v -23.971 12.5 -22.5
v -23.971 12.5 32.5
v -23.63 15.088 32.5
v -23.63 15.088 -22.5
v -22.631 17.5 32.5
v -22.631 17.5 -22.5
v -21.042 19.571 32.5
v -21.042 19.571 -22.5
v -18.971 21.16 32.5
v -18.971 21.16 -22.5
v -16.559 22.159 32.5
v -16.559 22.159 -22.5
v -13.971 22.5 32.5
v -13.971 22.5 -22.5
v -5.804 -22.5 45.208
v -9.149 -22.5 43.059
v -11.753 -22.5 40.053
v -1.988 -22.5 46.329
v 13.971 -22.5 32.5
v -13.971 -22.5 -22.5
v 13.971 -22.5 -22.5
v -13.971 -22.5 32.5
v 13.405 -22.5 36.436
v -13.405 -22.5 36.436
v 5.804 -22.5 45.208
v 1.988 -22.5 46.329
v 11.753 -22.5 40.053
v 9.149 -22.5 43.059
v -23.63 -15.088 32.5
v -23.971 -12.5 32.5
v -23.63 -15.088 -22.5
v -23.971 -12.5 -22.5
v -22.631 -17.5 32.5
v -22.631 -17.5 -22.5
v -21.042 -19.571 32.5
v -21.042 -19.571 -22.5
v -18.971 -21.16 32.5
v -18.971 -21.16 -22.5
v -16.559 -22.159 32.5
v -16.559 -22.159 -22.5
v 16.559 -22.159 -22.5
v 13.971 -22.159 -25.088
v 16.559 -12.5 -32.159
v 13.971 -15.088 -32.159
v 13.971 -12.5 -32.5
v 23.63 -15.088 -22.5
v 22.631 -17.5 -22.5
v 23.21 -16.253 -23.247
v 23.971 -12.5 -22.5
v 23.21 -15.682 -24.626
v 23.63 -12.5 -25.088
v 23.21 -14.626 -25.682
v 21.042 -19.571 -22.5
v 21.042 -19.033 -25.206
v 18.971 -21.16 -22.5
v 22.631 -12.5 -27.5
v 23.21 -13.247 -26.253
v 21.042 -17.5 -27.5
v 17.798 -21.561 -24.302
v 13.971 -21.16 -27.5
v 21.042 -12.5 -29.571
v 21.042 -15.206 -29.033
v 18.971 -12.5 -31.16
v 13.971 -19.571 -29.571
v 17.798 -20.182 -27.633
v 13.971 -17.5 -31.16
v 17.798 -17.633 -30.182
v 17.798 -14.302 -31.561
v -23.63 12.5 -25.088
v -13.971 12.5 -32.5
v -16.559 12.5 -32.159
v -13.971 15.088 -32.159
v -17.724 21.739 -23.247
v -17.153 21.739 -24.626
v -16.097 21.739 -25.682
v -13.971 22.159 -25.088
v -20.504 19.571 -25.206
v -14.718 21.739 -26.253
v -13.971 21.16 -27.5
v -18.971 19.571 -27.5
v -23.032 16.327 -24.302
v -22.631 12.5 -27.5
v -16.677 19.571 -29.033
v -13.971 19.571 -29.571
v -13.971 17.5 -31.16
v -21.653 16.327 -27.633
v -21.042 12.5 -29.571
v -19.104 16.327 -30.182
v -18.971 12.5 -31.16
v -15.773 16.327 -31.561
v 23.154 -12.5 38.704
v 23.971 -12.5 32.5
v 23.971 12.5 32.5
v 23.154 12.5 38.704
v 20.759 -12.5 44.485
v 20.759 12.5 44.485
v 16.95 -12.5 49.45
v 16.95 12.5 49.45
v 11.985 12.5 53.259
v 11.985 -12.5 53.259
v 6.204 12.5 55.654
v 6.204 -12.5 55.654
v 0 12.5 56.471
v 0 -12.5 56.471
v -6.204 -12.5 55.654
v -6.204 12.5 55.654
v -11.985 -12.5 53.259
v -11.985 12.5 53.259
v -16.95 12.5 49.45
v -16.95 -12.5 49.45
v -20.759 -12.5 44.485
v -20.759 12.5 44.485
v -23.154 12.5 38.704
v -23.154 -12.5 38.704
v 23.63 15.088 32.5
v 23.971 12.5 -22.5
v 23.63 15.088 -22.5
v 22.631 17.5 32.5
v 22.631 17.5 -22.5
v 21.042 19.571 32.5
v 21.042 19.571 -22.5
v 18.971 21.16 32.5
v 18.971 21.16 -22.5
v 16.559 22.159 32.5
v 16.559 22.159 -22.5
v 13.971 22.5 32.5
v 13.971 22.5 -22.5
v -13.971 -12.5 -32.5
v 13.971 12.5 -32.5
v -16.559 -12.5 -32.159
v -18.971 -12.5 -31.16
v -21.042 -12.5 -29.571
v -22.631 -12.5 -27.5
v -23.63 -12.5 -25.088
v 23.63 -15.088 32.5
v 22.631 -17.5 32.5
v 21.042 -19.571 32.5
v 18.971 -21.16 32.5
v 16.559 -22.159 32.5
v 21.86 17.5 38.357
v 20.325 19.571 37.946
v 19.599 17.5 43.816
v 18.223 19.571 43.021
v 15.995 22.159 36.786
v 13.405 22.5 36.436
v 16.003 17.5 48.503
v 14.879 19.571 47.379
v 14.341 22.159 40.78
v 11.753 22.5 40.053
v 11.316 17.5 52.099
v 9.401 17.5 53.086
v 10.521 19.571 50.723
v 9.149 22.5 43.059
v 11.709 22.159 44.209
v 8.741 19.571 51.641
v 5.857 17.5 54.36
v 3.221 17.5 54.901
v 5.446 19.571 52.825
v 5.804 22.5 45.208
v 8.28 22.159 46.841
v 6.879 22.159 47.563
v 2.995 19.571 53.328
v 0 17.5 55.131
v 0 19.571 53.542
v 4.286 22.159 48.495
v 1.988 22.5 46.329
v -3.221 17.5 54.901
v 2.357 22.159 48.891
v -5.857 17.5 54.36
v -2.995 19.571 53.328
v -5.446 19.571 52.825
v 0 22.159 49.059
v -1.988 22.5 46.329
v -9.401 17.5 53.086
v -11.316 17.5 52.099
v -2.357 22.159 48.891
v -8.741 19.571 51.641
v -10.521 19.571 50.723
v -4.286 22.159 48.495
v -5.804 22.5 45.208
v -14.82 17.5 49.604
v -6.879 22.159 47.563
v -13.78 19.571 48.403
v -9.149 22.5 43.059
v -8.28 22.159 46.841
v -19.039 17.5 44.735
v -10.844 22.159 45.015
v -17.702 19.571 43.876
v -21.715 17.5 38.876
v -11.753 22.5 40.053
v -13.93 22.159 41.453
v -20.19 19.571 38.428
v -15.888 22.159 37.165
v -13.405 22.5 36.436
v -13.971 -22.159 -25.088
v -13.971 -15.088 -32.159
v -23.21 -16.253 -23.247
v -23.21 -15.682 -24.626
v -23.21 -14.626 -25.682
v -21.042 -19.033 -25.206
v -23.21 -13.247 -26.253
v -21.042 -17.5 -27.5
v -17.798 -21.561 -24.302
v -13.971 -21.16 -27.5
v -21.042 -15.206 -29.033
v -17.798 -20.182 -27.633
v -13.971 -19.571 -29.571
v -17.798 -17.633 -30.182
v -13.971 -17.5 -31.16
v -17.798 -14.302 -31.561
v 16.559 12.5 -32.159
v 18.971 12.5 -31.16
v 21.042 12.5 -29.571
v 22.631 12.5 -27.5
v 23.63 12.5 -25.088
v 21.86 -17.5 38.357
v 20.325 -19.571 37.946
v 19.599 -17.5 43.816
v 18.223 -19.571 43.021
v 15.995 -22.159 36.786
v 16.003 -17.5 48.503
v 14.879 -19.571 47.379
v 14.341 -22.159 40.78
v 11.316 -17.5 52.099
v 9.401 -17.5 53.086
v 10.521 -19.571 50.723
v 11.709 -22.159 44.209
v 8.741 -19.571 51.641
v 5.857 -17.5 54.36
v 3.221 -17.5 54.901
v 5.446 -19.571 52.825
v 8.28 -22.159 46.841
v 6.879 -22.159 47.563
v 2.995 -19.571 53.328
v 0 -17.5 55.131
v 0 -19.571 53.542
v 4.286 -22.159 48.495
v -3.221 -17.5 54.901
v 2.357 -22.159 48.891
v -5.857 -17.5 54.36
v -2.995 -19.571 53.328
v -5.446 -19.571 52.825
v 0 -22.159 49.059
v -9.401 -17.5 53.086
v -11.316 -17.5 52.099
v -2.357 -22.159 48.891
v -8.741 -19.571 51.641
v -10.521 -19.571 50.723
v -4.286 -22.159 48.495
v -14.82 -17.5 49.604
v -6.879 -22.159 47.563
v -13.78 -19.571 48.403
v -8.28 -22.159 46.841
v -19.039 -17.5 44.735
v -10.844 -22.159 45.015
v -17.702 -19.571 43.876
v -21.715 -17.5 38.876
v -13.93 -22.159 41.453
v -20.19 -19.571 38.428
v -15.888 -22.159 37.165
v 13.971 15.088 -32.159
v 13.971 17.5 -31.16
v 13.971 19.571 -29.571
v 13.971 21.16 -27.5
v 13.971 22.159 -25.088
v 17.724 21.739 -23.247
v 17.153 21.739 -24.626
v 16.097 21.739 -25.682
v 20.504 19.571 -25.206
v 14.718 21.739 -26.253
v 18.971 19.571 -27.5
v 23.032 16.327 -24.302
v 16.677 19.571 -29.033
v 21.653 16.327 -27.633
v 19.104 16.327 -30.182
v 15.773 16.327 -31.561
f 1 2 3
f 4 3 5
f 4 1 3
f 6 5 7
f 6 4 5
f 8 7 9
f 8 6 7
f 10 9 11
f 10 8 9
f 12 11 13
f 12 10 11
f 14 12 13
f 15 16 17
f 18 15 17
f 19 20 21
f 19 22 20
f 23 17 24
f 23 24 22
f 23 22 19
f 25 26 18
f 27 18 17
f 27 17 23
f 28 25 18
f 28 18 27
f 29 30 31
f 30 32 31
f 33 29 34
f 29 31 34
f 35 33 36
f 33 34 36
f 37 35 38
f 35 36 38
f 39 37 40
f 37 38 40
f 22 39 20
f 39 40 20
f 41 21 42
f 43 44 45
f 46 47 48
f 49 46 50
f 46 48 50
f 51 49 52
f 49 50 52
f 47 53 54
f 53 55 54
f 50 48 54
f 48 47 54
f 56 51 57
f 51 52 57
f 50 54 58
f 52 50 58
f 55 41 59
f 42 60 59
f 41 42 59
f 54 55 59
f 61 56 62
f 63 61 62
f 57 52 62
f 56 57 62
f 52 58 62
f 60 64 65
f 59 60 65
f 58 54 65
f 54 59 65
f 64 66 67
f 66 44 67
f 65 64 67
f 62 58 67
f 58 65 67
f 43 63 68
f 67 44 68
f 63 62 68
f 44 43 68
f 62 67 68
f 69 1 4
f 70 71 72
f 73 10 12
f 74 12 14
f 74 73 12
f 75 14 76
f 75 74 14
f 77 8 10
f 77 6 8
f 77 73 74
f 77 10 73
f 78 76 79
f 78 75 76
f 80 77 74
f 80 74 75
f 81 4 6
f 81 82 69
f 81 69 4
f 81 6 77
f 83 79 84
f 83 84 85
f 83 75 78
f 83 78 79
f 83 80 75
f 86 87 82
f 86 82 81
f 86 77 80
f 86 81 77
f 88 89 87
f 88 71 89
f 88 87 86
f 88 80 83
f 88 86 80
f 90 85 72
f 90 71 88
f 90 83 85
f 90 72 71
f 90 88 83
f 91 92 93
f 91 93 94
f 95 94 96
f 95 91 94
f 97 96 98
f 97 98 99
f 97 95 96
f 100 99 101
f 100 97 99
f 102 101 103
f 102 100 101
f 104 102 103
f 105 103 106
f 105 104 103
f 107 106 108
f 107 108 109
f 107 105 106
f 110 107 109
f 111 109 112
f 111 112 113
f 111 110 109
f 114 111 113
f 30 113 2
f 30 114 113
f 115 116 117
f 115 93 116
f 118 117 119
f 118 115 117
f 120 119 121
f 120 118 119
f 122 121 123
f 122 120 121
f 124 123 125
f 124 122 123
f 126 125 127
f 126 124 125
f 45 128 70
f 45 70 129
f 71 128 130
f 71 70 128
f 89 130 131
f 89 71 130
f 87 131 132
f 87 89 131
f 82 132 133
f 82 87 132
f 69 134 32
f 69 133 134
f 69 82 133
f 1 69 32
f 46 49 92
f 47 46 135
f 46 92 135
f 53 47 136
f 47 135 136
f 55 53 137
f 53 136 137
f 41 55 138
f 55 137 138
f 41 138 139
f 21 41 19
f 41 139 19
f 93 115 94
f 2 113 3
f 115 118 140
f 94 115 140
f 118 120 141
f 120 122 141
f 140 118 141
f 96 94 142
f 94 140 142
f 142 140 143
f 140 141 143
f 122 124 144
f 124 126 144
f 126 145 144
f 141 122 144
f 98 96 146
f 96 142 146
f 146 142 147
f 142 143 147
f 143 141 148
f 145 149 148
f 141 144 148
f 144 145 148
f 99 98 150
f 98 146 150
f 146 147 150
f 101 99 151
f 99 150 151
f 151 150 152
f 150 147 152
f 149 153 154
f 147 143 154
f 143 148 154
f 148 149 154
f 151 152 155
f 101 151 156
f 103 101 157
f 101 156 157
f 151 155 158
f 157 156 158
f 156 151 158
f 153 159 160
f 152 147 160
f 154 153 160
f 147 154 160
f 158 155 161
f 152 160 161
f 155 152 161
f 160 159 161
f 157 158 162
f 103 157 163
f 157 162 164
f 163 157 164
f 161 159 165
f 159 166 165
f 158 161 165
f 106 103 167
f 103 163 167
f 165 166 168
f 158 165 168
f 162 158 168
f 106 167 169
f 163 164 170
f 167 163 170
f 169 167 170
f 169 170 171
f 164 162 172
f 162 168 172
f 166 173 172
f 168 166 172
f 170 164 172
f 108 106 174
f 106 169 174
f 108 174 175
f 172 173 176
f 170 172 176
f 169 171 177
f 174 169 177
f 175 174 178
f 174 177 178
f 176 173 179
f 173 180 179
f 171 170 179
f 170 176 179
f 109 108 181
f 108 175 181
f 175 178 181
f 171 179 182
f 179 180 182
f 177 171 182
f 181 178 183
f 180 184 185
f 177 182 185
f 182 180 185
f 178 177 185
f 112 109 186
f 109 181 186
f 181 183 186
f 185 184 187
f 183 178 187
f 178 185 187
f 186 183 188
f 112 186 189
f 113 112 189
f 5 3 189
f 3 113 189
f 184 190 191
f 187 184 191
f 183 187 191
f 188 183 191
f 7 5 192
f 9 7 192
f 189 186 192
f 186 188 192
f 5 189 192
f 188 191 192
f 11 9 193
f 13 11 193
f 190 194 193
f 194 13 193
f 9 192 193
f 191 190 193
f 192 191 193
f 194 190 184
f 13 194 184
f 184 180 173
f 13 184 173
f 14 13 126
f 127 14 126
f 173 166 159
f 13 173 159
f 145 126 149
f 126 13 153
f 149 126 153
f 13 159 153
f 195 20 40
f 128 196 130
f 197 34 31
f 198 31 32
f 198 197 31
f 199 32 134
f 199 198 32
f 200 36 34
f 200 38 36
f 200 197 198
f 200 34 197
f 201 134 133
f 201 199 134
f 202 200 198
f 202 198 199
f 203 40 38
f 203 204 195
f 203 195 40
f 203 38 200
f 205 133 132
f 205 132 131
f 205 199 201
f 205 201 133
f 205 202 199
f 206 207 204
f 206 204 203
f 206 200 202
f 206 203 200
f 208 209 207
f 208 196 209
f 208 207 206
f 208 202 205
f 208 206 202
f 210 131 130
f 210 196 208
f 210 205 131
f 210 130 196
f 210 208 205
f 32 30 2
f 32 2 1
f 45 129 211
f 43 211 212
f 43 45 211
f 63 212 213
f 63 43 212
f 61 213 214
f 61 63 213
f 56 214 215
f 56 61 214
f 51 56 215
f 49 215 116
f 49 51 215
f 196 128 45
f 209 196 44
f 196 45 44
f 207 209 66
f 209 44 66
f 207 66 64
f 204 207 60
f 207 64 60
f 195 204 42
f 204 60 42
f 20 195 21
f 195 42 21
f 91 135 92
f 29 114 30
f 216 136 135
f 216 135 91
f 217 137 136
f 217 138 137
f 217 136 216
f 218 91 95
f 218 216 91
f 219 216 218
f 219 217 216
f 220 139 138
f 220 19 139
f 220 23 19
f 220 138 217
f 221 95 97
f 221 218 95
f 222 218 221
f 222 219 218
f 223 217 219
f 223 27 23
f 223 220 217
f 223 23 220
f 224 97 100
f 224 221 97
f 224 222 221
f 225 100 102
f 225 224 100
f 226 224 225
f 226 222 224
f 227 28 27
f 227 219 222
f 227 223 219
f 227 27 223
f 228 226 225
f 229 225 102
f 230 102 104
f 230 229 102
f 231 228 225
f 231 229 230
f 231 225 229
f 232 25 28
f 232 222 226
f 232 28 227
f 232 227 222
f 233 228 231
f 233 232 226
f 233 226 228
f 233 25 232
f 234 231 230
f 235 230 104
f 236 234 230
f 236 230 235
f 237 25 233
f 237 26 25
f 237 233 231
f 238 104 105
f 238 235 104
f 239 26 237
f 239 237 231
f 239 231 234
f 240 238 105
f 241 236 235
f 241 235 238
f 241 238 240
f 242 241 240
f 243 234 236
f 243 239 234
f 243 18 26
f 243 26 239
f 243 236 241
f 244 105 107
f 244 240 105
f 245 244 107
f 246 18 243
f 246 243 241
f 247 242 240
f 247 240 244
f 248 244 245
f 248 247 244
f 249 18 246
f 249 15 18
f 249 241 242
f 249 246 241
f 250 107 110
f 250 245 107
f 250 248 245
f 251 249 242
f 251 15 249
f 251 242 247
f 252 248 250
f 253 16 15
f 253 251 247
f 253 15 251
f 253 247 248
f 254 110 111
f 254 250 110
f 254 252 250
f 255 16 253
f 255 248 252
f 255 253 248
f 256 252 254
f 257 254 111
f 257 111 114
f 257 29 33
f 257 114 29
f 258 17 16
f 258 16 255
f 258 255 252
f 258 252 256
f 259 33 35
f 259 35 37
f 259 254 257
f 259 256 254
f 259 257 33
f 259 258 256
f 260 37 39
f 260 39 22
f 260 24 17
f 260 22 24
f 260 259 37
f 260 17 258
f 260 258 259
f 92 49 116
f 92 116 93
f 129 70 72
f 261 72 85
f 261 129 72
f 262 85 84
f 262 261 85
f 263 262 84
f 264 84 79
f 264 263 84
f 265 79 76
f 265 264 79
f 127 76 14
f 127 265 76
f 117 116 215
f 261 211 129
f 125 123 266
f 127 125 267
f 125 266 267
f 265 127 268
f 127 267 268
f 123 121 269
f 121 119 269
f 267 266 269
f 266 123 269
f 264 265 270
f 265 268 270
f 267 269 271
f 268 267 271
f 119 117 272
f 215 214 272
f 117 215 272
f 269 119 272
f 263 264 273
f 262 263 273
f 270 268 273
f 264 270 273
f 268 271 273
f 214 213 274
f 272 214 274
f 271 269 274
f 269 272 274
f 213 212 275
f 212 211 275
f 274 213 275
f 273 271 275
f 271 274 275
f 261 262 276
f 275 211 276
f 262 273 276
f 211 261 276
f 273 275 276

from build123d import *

# Parameters (mm, degrees)
F0_R     = 19.4977351631
F1_DEPTH = 22.5
F2_R     = 10


with BuildPart() as f1:
    # F0 (on Front) → F1 (new body, symmetric)
    with BuildSketch(Plane.XZ):
        with BuildLine():
            Line((-23.9709949473, -32.5), (23.9709949473, -32.5))
            Line((23.9709949473, -32.5), (23.9709949473, 32.5))
            ThreePointArc((23.9709949473, 32.5), (0, 56.4709949473), (-23.9709949473, 32.5))
            Line((-23.9709949473, 32.5), (-23.9709949473, -32.5))
        make_face()
        with Locations((0, 32.5)):
            Circle(F0_R, mode=Mode.SUBTRACT)
        with Locations((0, 32.5)):
            Circle(F0_R)
    extrude(amount=F1_DEPTH, both=True)

    # F2
    f2_edges = [f1.edges().sort_by_distance(p)[0] for p in [
        (0, -22.5, -32.5),
        (-23.970995, -22.5, 0),
        (23.970995, 0, -32.5),
        (-23.970995, 0, -32.5),
        (23.970995, 22.5, 0),
        (0, 22.5, -32.5),
    ]]
    fillet(f2_edges, radius=F2_R)


solid = f1.part
